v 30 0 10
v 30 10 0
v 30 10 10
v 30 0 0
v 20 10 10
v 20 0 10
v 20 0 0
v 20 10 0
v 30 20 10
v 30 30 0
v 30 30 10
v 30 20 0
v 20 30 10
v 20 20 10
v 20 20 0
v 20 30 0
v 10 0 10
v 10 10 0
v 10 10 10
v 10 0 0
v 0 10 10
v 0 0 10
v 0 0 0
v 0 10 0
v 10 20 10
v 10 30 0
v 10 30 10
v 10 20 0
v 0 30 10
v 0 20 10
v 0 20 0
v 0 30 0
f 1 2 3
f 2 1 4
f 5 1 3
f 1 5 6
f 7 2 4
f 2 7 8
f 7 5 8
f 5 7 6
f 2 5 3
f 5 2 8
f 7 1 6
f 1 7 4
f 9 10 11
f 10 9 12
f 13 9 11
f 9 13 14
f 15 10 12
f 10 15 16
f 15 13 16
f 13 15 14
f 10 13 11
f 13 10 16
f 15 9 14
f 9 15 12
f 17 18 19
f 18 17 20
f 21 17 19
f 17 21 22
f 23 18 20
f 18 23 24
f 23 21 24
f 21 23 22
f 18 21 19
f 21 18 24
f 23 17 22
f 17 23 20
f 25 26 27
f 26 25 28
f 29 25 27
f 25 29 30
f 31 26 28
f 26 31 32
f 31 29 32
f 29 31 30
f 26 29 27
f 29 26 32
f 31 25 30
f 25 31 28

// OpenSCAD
render() {
  difference() {
    cube(10);
  }
}
render() {
  translate([0,20,0]) intersection() {
    cube(10);
  }
}
translate([20,0,0]) {
  render() {
    difference() {
      group();
      cube(10);
    }
  }
  render() {
    translate([0,20,0]) intersection() {
      group();
      cube(10);
    }
  }
}
